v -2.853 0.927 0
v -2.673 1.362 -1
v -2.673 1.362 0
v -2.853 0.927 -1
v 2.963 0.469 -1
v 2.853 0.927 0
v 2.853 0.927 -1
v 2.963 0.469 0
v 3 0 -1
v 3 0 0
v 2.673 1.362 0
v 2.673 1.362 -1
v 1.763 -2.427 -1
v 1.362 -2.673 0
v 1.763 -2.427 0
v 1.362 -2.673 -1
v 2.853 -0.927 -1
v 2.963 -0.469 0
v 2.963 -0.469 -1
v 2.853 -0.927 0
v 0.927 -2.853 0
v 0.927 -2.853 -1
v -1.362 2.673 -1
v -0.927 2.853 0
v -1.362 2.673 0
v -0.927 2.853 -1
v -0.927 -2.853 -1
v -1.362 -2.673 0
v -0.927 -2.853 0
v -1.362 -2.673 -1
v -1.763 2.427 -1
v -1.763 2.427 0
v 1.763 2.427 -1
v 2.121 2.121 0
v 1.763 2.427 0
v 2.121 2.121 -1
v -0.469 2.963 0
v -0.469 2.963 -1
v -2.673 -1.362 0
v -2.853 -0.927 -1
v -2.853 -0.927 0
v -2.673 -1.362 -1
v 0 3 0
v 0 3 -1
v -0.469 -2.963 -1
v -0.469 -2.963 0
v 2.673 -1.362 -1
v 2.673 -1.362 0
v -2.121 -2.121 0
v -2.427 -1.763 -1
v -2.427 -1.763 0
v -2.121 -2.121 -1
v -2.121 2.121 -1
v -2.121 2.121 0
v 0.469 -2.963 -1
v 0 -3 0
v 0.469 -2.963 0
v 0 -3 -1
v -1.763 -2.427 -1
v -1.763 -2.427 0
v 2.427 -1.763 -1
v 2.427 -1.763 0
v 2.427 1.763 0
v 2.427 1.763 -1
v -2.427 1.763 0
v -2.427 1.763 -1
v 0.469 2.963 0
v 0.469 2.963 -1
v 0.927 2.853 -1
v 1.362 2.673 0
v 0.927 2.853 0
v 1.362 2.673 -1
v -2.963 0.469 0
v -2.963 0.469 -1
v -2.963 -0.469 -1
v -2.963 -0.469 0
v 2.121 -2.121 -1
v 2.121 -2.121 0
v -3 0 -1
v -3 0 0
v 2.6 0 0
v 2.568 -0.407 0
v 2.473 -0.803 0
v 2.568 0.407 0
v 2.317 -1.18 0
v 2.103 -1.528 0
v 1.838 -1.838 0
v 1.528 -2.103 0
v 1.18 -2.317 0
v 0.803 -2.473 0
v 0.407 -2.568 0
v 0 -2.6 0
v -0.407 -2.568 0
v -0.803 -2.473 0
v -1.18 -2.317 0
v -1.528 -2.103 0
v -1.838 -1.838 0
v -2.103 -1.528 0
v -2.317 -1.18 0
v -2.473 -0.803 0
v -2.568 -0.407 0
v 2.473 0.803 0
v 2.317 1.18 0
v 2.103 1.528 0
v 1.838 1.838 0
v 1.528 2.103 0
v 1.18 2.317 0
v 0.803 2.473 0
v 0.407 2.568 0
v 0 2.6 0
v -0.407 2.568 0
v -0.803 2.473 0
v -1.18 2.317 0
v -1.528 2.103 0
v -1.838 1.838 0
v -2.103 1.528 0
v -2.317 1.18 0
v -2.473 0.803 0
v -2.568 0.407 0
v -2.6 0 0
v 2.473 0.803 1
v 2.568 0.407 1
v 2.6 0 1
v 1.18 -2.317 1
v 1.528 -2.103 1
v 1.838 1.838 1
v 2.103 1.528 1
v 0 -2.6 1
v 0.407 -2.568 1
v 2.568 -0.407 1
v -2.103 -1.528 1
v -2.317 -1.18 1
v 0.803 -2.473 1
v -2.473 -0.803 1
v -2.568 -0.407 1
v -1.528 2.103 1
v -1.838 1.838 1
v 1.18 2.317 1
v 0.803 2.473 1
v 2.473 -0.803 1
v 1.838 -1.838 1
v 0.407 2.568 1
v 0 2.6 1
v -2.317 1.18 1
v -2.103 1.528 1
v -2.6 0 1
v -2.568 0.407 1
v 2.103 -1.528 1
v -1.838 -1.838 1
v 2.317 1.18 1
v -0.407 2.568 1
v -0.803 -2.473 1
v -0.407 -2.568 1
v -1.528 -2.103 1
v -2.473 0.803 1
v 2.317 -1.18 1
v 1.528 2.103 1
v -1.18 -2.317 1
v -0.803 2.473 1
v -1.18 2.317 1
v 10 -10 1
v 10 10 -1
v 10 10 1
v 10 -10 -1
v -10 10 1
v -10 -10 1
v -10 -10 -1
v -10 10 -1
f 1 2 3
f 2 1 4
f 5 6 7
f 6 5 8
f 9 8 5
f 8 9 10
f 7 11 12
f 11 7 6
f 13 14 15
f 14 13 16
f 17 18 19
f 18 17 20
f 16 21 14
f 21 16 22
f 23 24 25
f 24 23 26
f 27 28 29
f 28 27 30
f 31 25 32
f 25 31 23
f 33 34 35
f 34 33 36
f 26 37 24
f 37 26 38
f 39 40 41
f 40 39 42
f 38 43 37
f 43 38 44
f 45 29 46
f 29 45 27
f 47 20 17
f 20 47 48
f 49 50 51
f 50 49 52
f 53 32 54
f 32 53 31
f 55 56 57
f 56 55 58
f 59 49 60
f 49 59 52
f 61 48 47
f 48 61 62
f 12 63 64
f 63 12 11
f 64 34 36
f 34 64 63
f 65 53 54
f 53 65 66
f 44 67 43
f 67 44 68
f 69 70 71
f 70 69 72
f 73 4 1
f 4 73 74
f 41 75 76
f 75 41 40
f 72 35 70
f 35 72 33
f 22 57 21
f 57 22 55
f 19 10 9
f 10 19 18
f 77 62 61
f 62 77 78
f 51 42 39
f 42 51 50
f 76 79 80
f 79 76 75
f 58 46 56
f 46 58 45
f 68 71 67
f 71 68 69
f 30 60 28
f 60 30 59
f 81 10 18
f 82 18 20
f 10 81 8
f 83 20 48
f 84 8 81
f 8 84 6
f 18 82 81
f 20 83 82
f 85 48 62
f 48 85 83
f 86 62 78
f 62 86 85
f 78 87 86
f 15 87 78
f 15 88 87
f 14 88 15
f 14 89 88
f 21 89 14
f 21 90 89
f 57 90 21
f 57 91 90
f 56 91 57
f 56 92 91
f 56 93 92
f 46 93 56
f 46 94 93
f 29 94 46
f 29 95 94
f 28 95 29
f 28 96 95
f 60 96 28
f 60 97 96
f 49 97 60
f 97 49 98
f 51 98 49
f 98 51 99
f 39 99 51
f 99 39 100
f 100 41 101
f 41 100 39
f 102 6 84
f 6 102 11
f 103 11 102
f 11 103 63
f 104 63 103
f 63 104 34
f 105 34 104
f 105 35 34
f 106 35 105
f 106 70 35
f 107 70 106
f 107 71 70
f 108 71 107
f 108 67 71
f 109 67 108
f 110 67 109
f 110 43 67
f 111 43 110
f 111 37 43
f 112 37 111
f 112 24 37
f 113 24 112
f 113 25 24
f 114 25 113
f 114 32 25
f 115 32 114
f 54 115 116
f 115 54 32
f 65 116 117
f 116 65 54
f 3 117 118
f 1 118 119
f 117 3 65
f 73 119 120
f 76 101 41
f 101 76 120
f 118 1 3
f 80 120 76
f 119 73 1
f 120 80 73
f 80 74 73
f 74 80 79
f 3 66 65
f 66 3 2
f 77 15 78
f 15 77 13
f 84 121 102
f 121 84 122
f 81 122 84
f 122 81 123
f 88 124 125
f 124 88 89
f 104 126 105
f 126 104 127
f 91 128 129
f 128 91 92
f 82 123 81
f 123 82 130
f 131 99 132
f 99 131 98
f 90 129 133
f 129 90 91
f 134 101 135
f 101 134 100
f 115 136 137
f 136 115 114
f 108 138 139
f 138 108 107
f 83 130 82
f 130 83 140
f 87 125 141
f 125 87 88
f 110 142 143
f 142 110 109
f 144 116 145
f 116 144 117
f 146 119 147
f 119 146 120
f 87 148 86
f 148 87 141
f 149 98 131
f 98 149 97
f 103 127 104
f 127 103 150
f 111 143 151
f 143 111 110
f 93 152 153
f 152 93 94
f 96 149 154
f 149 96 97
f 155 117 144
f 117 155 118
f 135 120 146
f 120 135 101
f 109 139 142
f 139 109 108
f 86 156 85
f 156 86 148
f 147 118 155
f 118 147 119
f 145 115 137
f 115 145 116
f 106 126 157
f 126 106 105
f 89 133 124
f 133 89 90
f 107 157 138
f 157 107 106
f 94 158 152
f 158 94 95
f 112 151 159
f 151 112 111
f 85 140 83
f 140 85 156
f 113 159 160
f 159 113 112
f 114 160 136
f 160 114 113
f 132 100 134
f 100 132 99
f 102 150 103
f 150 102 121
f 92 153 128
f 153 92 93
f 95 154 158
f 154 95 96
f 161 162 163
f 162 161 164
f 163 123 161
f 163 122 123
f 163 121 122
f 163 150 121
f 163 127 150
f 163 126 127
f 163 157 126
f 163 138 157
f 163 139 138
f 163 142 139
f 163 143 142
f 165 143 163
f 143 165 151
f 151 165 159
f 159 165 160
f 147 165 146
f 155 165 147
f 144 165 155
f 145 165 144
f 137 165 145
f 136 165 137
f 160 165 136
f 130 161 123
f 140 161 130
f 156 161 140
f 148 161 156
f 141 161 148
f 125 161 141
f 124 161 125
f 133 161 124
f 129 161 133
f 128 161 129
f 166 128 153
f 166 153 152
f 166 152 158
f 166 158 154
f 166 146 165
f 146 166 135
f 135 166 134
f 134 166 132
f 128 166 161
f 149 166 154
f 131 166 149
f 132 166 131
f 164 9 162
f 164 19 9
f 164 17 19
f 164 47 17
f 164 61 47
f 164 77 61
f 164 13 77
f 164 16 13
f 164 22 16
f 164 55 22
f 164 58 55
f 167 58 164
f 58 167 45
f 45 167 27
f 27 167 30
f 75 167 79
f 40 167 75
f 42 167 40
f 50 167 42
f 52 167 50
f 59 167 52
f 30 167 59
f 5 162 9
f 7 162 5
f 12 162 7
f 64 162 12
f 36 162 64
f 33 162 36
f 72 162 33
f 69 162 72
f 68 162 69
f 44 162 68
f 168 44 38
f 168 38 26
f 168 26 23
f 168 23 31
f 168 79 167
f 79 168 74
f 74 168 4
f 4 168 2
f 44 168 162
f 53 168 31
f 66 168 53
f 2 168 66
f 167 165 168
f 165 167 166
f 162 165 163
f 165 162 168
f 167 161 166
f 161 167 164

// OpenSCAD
// file: rounded_rectangle.scad
module rounded_rectangle_prism(width, height, depth, corner_radius){
    horiz_dist = width/2 - corner_radius;
    vert_dist = height/2 - corner_radius;
    hull(){
        translate([0, vert_dist, 0]){
            hull(){
                translate([horiz_dist, 0, 0]){
                    cylinder(r=corner_radius, h=depth, center=true);
                }
                translate([-horiz_dist, 0, 0]){
                    cylinder(r=corner_radius, h=depth, center=true);
                }
            }
        }
        translate([0, -vert_dist, 0]){
            hull(){
                translate([horiz_dist, 0, 0]){
                    cylinder(r=corner_radius, h=depth, center=true);
                }
                translate([-horiz_dist, 0, 0]){
                    cylinder(r=corner_radius, h=depth, center=true);
                }
            }
        }
    }
}
// file: rect.scad
RECT_MATRIX = [ 
    [ 1, 1], 
    [ 1,-1], 
    [-1,-1], 
    [-1, 1] 
];

// returns an array of points that define a rectangle
function rect(wd,ln) = [
        for (rm = RECT_MATRIX) 
            [rm[0]*wd/2, rm[1]*ln/2]
    ];
// main file
include <rect.scad>
include <rounded_rectangle.scad>

$fn=40;


LED_HOLE_RD = 6/2;
LED_COLLAR_RD = 5.2/2;
LED_HOLE_LEN = 40;

module LED_hole(led_hole_rd, led_collar_rd){
    translate([0, 0, -LED_HOLE_LEN]){
        cylinder(h = LED_HOLE_LEN, r = led_hole_rd);
    }
    cylinder(h = 6, r = led_collar_rd);
}

LED_TILT= 25;
module rotated_LED_hole(){
    rotate([LED_TILT, 0, 0]){
        LED_hole();
    }
}



difference(){
    cube([20,20,2],center=true);
    LED_hole(LED_HOLE_RD,LED_COLLAR_RD);
}
